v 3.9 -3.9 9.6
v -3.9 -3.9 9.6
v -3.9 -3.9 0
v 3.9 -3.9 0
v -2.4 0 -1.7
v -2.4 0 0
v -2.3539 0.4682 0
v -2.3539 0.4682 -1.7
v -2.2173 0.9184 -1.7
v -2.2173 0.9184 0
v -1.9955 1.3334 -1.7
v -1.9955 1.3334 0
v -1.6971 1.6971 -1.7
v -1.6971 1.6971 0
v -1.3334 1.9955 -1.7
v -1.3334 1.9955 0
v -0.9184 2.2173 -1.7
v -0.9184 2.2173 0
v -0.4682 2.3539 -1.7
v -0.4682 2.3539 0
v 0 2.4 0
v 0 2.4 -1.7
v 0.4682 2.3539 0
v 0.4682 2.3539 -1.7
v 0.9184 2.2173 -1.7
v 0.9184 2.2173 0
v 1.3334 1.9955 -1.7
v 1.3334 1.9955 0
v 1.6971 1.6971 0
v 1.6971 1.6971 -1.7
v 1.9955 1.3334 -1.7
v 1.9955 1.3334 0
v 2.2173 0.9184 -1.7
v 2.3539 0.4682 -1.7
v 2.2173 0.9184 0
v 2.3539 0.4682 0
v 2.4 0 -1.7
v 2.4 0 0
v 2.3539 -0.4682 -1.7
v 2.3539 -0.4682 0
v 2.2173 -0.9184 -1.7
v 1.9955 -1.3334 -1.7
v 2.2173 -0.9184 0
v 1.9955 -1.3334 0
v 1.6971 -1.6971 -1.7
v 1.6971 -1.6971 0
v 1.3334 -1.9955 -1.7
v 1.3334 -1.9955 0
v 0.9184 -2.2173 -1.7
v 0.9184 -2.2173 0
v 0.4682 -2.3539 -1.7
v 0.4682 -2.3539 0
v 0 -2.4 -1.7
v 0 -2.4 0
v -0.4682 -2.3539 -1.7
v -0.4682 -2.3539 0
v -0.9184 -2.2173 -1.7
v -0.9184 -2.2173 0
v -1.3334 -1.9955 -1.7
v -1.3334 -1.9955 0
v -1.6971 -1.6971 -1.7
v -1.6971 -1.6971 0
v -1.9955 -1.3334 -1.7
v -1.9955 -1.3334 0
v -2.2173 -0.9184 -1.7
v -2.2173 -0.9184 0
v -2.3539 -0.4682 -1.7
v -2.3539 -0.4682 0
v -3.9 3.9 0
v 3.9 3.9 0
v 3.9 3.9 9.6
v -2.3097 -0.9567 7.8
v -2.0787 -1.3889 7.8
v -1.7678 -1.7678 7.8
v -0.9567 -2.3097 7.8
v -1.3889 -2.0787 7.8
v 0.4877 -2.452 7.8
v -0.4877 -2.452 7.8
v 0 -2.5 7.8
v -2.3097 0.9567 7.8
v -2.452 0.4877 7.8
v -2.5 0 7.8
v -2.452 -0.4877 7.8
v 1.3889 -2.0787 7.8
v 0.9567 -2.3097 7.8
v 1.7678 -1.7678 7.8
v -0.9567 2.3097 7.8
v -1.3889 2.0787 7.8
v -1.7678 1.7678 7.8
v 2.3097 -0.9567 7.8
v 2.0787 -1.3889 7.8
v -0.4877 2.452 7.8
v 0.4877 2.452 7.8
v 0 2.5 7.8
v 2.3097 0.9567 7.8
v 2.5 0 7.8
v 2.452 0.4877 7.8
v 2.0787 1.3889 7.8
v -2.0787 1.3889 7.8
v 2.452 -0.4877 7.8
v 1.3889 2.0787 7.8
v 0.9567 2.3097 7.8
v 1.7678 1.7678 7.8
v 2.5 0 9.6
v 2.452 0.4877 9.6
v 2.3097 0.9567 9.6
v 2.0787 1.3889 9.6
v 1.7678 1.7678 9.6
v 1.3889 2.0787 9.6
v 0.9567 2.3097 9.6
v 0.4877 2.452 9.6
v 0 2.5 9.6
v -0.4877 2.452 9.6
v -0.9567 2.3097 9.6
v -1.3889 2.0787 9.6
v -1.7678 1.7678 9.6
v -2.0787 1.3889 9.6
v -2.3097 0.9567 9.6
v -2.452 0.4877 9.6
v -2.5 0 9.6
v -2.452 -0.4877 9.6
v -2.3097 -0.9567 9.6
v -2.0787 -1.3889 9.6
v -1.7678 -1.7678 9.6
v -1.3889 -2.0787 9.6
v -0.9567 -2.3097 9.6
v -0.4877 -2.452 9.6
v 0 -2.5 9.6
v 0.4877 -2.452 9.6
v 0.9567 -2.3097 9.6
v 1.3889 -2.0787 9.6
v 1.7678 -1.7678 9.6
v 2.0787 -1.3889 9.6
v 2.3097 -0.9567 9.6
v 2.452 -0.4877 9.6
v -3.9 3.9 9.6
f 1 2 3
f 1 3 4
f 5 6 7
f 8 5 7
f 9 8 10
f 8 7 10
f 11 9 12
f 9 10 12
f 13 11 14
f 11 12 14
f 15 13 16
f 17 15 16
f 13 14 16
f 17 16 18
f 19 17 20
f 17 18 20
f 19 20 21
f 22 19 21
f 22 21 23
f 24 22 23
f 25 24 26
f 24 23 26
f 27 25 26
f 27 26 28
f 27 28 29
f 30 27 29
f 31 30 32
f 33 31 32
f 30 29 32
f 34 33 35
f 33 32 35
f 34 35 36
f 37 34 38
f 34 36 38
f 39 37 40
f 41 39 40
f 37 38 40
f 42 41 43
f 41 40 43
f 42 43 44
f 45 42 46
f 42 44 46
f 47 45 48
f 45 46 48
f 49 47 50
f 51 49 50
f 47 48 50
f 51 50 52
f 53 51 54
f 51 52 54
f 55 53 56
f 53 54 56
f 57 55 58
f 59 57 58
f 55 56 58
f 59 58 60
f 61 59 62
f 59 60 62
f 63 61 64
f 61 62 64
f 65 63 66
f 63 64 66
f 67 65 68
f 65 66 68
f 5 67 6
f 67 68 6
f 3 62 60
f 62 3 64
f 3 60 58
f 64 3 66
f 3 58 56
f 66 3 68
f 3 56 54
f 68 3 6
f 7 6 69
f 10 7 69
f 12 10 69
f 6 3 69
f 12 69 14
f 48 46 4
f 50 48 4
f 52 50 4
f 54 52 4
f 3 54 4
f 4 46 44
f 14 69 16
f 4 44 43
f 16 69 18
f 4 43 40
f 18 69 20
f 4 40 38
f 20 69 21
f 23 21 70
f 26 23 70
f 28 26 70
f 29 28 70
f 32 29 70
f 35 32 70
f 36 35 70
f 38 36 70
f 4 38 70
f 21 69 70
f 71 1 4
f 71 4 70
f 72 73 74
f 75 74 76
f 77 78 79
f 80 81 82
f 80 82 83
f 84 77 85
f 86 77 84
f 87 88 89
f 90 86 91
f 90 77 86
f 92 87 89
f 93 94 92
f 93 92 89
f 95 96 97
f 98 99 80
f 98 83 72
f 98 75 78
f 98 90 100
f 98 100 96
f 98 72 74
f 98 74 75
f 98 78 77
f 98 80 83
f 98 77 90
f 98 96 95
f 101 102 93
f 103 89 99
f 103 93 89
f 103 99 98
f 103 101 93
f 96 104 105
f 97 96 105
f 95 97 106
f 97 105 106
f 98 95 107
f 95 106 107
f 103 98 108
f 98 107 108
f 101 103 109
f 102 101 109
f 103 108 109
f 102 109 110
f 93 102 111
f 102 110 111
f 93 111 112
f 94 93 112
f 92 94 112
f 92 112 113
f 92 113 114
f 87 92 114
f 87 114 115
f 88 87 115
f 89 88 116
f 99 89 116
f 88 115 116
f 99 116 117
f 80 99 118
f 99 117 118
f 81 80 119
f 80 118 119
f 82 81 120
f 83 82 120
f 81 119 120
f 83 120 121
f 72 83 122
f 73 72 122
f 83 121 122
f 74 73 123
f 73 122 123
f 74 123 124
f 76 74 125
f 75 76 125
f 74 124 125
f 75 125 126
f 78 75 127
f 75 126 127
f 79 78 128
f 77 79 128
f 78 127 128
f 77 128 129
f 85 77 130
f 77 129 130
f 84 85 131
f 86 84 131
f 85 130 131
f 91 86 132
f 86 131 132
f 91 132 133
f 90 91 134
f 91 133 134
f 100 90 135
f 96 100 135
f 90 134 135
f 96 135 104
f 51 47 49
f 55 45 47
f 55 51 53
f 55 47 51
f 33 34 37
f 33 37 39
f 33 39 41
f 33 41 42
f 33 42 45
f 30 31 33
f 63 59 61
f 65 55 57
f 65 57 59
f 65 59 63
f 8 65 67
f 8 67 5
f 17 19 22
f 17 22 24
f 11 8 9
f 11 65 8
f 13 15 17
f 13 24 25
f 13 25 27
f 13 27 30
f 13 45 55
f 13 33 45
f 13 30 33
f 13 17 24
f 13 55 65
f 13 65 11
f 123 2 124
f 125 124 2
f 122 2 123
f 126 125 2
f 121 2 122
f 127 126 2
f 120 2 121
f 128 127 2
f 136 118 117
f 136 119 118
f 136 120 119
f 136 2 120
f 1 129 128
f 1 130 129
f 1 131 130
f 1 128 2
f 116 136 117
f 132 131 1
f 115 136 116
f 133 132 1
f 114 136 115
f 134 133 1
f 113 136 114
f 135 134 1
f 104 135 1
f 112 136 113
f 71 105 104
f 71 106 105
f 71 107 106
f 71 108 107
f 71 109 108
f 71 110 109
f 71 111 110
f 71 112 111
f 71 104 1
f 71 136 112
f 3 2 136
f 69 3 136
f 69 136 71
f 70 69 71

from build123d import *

# Parameters (mm, degrees)
SKETCH_1_W          = 7.8
SKETCH_1_H          = 7.8
EXTRUDE_1_DEPTH     = 9.6
SKETCH_2_R          = 2.4
EXTRUDE_2_DEPTH     = 1.7
SKETCH_3_R          = 2.5
CUT_EXTRUDE_1_DEPTH = 1.8


with BuildPart() as part:
    # Эскиз1 → Бобышка-Вытянуть1 (new body)
    with BuildSketch(Plane.XY):
        Rectangle(SKETCH_1_W, SKETCH_1_H)
    extrude(amount=EXTRUDE_1_DEPTH)

    # Эскиз2 → Бобышка-Вытянуть2 (add)
    with BuildSketch(Plane(origin=(0, 0, 0), x_dir=(-1, 0, 0), z_dir=(0, 0, -1))):
        Circle(SKETCH_2_R)
    extrude(amount=EXTRUDE_2_DEPTH)

    # Эскиз3 → Вырез-Вытянуть1 (cut)
    with BuildSketch(Plane.XY.offset(9.6)):
        Circle(SKETCH_3_R)
    extrude(amount=-CUT_EXTRUDE_1_DEPTH, mode=Mode.SUBTRACT)


solid = part.part
